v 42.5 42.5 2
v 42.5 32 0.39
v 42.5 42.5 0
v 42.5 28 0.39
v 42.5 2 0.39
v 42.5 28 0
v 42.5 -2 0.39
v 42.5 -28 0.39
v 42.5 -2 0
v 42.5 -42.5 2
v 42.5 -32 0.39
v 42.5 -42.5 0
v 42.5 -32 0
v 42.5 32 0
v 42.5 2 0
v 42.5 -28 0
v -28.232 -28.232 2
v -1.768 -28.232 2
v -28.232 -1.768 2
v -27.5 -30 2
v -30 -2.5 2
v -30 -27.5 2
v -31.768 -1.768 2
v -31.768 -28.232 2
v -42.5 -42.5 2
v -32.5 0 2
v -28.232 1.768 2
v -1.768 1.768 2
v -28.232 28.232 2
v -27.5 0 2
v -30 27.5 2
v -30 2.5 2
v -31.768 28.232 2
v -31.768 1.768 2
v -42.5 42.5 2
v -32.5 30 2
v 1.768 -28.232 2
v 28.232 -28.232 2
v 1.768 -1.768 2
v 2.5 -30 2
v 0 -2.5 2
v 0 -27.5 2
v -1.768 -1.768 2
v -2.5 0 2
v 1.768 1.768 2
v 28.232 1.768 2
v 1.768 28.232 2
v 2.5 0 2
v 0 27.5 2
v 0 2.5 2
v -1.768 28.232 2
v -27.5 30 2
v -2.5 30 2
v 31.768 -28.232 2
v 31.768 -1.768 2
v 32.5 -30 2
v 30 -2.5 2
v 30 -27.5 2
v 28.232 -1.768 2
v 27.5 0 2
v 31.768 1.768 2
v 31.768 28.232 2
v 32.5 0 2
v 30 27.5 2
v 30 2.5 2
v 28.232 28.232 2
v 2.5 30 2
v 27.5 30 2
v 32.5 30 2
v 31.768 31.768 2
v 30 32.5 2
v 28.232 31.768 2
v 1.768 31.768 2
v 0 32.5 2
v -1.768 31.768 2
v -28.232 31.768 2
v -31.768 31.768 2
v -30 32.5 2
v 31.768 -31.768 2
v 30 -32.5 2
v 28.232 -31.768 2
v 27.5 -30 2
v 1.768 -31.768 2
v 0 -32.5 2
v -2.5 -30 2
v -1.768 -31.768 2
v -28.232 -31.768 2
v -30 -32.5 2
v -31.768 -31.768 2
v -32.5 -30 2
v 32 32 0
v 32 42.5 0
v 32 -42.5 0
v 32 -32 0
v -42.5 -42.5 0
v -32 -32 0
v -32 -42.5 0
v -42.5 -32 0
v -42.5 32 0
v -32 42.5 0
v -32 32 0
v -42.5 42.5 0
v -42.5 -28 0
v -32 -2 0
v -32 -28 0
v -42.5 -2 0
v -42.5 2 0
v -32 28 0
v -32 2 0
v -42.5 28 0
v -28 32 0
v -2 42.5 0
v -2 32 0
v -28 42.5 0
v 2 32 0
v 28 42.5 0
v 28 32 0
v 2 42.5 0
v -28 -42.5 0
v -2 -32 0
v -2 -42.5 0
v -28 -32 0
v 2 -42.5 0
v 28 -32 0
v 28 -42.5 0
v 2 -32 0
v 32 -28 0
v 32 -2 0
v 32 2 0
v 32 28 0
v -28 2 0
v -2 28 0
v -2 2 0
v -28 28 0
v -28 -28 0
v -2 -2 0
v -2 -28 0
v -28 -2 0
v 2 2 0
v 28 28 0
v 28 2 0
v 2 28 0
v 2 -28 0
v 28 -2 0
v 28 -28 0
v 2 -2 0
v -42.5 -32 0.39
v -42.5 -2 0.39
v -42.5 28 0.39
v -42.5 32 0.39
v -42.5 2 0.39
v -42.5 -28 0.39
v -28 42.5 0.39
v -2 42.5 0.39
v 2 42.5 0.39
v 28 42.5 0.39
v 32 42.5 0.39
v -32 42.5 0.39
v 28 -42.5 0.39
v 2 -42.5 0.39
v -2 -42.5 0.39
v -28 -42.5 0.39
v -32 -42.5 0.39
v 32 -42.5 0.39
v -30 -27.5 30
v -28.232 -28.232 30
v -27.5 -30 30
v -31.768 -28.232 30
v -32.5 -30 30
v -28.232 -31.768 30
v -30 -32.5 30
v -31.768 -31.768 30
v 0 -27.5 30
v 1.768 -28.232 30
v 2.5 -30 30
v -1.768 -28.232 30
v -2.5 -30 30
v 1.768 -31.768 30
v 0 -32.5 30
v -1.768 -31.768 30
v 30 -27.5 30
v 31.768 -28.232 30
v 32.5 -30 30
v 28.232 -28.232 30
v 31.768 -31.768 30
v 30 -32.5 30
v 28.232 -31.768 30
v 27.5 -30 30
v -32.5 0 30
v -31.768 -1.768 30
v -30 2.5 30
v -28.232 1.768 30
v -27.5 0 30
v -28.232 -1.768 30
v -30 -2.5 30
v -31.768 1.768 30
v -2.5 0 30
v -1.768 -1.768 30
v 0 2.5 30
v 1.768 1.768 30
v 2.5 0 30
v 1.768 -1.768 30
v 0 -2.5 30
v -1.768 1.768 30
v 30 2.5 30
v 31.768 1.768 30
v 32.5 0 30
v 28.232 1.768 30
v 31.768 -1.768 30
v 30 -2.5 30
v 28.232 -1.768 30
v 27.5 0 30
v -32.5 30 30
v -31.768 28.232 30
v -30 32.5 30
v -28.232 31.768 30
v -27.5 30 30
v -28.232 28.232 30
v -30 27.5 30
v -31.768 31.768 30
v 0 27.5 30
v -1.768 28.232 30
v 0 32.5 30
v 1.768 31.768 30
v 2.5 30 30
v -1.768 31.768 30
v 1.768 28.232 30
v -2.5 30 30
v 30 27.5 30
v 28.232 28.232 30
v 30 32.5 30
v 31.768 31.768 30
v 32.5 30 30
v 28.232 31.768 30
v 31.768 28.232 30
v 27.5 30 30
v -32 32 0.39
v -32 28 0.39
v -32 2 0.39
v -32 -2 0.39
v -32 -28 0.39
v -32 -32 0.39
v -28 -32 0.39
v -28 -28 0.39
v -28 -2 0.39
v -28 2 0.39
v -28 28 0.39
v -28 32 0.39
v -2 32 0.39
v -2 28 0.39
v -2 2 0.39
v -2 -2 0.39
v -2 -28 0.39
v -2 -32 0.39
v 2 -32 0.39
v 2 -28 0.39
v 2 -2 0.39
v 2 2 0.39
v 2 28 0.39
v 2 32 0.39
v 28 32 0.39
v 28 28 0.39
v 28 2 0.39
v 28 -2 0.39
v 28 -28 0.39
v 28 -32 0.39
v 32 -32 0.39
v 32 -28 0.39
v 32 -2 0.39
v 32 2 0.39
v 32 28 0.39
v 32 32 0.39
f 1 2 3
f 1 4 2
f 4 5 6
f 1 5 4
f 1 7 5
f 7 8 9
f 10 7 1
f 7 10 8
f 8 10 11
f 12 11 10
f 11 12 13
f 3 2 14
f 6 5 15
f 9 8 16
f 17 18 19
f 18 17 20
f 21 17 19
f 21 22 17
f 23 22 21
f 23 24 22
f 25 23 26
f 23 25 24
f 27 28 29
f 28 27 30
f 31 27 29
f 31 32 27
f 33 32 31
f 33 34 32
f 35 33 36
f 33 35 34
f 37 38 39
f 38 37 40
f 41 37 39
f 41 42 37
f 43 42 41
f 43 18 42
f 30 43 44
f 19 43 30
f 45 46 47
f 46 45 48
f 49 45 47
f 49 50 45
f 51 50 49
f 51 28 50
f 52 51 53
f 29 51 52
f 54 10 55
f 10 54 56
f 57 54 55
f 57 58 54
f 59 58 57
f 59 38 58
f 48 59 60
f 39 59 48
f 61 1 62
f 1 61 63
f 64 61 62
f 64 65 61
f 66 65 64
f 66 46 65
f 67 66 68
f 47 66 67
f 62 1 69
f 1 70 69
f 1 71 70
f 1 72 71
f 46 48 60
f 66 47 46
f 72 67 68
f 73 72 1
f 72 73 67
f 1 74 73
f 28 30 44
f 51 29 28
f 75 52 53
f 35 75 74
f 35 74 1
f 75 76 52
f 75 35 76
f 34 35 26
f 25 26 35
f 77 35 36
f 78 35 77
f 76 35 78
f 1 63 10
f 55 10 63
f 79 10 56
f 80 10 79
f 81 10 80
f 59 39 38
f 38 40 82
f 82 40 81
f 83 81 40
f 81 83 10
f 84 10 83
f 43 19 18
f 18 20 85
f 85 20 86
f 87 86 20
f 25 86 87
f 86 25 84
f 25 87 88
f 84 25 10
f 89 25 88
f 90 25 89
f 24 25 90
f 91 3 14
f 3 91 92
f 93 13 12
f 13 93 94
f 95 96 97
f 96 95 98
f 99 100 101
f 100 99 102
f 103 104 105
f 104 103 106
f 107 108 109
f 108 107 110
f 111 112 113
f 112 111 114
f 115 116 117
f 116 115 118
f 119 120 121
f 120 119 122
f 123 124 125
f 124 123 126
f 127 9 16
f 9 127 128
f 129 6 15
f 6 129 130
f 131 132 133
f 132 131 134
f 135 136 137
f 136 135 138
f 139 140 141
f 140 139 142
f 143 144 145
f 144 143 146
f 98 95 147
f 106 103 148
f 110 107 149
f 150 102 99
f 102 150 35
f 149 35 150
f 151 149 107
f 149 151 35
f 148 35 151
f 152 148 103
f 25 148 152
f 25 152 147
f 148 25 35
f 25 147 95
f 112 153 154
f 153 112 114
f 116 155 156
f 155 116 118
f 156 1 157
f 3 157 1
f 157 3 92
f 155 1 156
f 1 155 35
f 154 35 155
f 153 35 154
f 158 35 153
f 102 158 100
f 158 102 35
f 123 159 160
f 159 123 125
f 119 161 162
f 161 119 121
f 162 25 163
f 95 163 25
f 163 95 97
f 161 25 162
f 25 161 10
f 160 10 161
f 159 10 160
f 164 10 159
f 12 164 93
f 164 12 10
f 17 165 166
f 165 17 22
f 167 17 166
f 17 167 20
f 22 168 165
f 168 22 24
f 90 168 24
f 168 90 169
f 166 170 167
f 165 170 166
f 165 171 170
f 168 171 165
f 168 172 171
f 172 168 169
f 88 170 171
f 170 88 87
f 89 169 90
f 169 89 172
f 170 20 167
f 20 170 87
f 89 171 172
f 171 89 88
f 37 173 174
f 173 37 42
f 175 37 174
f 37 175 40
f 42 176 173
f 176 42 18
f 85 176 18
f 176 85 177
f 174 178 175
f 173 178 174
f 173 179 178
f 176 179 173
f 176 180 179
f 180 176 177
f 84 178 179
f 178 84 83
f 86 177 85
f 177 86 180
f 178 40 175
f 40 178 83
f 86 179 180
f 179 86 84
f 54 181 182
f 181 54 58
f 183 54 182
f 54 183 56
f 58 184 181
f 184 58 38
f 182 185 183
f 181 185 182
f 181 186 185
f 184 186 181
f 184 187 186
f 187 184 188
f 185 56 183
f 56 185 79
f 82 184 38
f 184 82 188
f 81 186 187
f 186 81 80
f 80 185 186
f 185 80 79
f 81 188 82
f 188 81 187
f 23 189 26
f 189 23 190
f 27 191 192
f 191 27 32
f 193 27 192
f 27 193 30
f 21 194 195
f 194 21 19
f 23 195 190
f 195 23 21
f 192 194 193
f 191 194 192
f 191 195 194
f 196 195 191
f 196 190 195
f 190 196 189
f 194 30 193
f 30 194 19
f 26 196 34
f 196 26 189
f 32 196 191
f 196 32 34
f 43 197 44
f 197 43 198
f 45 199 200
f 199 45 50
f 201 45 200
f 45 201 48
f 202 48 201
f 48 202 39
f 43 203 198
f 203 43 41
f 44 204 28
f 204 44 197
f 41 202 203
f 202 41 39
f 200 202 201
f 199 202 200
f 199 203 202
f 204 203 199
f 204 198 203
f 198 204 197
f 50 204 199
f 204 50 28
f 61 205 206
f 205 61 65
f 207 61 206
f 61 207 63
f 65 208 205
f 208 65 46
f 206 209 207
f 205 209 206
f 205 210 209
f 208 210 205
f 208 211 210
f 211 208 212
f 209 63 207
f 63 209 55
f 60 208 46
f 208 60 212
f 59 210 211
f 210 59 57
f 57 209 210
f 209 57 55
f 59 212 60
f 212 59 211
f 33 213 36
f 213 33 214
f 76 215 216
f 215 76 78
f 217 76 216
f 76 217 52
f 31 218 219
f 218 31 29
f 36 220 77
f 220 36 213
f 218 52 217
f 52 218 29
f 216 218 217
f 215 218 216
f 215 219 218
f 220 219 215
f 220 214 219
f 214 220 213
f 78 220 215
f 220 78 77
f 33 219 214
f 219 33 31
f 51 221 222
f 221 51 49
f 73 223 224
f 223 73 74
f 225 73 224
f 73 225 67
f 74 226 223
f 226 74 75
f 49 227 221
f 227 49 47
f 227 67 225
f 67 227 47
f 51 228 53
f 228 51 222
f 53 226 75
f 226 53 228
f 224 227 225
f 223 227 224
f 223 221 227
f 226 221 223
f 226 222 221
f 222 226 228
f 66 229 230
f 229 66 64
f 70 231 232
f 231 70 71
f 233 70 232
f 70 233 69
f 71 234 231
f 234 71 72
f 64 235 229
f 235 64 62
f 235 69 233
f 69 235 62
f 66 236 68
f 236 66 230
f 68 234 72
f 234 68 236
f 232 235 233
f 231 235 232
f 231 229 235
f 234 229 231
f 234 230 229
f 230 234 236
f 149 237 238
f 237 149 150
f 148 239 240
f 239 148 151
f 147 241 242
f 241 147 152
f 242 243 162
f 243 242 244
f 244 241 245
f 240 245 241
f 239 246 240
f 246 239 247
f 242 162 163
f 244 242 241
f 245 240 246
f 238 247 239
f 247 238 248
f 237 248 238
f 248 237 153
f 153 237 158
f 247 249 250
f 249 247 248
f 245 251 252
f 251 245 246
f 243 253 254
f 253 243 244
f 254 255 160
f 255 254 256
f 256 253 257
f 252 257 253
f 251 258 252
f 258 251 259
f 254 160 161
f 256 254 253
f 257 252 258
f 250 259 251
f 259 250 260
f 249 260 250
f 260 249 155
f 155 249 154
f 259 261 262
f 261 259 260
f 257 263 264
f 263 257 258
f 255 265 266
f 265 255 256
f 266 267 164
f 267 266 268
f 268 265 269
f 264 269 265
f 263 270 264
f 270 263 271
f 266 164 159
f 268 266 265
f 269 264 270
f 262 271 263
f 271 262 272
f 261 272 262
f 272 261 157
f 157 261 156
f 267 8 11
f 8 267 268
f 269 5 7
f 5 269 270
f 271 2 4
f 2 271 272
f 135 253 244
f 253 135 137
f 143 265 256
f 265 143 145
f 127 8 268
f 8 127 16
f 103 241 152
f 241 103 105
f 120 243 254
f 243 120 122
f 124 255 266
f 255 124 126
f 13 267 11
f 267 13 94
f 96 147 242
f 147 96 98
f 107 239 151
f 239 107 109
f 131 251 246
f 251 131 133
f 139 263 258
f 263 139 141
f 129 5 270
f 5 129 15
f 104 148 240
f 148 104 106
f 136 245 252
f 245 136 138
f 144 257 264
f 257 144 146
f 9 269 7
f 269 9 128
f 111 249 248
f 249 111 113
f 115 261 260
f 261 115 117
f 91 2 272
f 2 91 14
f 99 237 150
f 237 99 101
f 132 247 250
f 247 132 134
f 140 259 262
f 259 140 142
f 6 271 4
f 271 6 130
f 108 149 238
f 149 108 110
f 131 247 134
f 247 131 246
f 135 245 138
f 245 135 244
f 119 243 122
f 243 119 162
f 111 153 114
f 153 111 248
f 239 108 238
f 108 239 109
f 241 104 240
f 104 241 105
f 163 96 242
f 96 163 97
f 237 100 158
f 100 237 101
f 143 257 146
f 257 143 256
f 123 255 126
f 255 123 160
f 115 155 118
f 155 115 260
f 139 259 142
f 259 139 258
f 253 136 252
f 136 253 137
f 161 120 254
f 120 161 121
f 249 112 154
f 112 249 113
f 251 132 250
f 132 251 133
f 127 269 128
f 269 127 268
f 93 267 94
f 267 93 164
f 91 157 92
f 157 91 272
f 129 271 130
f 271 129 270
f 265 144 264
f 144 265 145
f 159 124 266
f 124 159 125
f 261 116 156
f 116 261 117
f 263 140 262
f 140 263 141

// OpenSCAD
difference() {
union() {
    translate([0,0,1]) cube([85,85,2], true);
//    translate([0,0,1]) cube([83,83,2], true);
    translate([-30,-30,0]) cylinder(h=30, r1=2.5, r2=2.5);
    translate([ 00,-30,0]) cylinder(h=30, r1=2.5, r2=2.5);
    translate([+30,-30,0]) cylinder(h=30, r1=2.5, r2=2.5);
    translate([-30, 00,0]) cylinder(h=30, r1=2.5, r2=2.5);
    translate([-00, 00,0]) cylinder(h=30, r1=2.5, r2=2.5);
    translate([+30, 00,0]) cylinder(h=30, r1=2.5, r2=2.5);
    translate([-30,+30,0]) cylinder(h=30, r1=2.5, r2=2.5);
    translate([ 00,+30,0]) cylinder(h=30, r1=2.5, r2=2.5);
    translate([+30,+30,0]) cylinder(h=30, r1=2.5, r2=2.5);
}
union() {
    translate([0,-30,0.19]) cube([100,4,0.4], true);
    translate([0,0,0.19]) cube([100,4,0.4], true);
    translate([0,30,0.19]) cube([100,4,0.4], true);
    translate([-30,0,0.19]) cube([4,100,0.4], true);
    translate([0,0,0.19]) cube([4,100,0.4], true);
    translate([30,0,0.19]) cube([4,100,0.4], true);
}
}
